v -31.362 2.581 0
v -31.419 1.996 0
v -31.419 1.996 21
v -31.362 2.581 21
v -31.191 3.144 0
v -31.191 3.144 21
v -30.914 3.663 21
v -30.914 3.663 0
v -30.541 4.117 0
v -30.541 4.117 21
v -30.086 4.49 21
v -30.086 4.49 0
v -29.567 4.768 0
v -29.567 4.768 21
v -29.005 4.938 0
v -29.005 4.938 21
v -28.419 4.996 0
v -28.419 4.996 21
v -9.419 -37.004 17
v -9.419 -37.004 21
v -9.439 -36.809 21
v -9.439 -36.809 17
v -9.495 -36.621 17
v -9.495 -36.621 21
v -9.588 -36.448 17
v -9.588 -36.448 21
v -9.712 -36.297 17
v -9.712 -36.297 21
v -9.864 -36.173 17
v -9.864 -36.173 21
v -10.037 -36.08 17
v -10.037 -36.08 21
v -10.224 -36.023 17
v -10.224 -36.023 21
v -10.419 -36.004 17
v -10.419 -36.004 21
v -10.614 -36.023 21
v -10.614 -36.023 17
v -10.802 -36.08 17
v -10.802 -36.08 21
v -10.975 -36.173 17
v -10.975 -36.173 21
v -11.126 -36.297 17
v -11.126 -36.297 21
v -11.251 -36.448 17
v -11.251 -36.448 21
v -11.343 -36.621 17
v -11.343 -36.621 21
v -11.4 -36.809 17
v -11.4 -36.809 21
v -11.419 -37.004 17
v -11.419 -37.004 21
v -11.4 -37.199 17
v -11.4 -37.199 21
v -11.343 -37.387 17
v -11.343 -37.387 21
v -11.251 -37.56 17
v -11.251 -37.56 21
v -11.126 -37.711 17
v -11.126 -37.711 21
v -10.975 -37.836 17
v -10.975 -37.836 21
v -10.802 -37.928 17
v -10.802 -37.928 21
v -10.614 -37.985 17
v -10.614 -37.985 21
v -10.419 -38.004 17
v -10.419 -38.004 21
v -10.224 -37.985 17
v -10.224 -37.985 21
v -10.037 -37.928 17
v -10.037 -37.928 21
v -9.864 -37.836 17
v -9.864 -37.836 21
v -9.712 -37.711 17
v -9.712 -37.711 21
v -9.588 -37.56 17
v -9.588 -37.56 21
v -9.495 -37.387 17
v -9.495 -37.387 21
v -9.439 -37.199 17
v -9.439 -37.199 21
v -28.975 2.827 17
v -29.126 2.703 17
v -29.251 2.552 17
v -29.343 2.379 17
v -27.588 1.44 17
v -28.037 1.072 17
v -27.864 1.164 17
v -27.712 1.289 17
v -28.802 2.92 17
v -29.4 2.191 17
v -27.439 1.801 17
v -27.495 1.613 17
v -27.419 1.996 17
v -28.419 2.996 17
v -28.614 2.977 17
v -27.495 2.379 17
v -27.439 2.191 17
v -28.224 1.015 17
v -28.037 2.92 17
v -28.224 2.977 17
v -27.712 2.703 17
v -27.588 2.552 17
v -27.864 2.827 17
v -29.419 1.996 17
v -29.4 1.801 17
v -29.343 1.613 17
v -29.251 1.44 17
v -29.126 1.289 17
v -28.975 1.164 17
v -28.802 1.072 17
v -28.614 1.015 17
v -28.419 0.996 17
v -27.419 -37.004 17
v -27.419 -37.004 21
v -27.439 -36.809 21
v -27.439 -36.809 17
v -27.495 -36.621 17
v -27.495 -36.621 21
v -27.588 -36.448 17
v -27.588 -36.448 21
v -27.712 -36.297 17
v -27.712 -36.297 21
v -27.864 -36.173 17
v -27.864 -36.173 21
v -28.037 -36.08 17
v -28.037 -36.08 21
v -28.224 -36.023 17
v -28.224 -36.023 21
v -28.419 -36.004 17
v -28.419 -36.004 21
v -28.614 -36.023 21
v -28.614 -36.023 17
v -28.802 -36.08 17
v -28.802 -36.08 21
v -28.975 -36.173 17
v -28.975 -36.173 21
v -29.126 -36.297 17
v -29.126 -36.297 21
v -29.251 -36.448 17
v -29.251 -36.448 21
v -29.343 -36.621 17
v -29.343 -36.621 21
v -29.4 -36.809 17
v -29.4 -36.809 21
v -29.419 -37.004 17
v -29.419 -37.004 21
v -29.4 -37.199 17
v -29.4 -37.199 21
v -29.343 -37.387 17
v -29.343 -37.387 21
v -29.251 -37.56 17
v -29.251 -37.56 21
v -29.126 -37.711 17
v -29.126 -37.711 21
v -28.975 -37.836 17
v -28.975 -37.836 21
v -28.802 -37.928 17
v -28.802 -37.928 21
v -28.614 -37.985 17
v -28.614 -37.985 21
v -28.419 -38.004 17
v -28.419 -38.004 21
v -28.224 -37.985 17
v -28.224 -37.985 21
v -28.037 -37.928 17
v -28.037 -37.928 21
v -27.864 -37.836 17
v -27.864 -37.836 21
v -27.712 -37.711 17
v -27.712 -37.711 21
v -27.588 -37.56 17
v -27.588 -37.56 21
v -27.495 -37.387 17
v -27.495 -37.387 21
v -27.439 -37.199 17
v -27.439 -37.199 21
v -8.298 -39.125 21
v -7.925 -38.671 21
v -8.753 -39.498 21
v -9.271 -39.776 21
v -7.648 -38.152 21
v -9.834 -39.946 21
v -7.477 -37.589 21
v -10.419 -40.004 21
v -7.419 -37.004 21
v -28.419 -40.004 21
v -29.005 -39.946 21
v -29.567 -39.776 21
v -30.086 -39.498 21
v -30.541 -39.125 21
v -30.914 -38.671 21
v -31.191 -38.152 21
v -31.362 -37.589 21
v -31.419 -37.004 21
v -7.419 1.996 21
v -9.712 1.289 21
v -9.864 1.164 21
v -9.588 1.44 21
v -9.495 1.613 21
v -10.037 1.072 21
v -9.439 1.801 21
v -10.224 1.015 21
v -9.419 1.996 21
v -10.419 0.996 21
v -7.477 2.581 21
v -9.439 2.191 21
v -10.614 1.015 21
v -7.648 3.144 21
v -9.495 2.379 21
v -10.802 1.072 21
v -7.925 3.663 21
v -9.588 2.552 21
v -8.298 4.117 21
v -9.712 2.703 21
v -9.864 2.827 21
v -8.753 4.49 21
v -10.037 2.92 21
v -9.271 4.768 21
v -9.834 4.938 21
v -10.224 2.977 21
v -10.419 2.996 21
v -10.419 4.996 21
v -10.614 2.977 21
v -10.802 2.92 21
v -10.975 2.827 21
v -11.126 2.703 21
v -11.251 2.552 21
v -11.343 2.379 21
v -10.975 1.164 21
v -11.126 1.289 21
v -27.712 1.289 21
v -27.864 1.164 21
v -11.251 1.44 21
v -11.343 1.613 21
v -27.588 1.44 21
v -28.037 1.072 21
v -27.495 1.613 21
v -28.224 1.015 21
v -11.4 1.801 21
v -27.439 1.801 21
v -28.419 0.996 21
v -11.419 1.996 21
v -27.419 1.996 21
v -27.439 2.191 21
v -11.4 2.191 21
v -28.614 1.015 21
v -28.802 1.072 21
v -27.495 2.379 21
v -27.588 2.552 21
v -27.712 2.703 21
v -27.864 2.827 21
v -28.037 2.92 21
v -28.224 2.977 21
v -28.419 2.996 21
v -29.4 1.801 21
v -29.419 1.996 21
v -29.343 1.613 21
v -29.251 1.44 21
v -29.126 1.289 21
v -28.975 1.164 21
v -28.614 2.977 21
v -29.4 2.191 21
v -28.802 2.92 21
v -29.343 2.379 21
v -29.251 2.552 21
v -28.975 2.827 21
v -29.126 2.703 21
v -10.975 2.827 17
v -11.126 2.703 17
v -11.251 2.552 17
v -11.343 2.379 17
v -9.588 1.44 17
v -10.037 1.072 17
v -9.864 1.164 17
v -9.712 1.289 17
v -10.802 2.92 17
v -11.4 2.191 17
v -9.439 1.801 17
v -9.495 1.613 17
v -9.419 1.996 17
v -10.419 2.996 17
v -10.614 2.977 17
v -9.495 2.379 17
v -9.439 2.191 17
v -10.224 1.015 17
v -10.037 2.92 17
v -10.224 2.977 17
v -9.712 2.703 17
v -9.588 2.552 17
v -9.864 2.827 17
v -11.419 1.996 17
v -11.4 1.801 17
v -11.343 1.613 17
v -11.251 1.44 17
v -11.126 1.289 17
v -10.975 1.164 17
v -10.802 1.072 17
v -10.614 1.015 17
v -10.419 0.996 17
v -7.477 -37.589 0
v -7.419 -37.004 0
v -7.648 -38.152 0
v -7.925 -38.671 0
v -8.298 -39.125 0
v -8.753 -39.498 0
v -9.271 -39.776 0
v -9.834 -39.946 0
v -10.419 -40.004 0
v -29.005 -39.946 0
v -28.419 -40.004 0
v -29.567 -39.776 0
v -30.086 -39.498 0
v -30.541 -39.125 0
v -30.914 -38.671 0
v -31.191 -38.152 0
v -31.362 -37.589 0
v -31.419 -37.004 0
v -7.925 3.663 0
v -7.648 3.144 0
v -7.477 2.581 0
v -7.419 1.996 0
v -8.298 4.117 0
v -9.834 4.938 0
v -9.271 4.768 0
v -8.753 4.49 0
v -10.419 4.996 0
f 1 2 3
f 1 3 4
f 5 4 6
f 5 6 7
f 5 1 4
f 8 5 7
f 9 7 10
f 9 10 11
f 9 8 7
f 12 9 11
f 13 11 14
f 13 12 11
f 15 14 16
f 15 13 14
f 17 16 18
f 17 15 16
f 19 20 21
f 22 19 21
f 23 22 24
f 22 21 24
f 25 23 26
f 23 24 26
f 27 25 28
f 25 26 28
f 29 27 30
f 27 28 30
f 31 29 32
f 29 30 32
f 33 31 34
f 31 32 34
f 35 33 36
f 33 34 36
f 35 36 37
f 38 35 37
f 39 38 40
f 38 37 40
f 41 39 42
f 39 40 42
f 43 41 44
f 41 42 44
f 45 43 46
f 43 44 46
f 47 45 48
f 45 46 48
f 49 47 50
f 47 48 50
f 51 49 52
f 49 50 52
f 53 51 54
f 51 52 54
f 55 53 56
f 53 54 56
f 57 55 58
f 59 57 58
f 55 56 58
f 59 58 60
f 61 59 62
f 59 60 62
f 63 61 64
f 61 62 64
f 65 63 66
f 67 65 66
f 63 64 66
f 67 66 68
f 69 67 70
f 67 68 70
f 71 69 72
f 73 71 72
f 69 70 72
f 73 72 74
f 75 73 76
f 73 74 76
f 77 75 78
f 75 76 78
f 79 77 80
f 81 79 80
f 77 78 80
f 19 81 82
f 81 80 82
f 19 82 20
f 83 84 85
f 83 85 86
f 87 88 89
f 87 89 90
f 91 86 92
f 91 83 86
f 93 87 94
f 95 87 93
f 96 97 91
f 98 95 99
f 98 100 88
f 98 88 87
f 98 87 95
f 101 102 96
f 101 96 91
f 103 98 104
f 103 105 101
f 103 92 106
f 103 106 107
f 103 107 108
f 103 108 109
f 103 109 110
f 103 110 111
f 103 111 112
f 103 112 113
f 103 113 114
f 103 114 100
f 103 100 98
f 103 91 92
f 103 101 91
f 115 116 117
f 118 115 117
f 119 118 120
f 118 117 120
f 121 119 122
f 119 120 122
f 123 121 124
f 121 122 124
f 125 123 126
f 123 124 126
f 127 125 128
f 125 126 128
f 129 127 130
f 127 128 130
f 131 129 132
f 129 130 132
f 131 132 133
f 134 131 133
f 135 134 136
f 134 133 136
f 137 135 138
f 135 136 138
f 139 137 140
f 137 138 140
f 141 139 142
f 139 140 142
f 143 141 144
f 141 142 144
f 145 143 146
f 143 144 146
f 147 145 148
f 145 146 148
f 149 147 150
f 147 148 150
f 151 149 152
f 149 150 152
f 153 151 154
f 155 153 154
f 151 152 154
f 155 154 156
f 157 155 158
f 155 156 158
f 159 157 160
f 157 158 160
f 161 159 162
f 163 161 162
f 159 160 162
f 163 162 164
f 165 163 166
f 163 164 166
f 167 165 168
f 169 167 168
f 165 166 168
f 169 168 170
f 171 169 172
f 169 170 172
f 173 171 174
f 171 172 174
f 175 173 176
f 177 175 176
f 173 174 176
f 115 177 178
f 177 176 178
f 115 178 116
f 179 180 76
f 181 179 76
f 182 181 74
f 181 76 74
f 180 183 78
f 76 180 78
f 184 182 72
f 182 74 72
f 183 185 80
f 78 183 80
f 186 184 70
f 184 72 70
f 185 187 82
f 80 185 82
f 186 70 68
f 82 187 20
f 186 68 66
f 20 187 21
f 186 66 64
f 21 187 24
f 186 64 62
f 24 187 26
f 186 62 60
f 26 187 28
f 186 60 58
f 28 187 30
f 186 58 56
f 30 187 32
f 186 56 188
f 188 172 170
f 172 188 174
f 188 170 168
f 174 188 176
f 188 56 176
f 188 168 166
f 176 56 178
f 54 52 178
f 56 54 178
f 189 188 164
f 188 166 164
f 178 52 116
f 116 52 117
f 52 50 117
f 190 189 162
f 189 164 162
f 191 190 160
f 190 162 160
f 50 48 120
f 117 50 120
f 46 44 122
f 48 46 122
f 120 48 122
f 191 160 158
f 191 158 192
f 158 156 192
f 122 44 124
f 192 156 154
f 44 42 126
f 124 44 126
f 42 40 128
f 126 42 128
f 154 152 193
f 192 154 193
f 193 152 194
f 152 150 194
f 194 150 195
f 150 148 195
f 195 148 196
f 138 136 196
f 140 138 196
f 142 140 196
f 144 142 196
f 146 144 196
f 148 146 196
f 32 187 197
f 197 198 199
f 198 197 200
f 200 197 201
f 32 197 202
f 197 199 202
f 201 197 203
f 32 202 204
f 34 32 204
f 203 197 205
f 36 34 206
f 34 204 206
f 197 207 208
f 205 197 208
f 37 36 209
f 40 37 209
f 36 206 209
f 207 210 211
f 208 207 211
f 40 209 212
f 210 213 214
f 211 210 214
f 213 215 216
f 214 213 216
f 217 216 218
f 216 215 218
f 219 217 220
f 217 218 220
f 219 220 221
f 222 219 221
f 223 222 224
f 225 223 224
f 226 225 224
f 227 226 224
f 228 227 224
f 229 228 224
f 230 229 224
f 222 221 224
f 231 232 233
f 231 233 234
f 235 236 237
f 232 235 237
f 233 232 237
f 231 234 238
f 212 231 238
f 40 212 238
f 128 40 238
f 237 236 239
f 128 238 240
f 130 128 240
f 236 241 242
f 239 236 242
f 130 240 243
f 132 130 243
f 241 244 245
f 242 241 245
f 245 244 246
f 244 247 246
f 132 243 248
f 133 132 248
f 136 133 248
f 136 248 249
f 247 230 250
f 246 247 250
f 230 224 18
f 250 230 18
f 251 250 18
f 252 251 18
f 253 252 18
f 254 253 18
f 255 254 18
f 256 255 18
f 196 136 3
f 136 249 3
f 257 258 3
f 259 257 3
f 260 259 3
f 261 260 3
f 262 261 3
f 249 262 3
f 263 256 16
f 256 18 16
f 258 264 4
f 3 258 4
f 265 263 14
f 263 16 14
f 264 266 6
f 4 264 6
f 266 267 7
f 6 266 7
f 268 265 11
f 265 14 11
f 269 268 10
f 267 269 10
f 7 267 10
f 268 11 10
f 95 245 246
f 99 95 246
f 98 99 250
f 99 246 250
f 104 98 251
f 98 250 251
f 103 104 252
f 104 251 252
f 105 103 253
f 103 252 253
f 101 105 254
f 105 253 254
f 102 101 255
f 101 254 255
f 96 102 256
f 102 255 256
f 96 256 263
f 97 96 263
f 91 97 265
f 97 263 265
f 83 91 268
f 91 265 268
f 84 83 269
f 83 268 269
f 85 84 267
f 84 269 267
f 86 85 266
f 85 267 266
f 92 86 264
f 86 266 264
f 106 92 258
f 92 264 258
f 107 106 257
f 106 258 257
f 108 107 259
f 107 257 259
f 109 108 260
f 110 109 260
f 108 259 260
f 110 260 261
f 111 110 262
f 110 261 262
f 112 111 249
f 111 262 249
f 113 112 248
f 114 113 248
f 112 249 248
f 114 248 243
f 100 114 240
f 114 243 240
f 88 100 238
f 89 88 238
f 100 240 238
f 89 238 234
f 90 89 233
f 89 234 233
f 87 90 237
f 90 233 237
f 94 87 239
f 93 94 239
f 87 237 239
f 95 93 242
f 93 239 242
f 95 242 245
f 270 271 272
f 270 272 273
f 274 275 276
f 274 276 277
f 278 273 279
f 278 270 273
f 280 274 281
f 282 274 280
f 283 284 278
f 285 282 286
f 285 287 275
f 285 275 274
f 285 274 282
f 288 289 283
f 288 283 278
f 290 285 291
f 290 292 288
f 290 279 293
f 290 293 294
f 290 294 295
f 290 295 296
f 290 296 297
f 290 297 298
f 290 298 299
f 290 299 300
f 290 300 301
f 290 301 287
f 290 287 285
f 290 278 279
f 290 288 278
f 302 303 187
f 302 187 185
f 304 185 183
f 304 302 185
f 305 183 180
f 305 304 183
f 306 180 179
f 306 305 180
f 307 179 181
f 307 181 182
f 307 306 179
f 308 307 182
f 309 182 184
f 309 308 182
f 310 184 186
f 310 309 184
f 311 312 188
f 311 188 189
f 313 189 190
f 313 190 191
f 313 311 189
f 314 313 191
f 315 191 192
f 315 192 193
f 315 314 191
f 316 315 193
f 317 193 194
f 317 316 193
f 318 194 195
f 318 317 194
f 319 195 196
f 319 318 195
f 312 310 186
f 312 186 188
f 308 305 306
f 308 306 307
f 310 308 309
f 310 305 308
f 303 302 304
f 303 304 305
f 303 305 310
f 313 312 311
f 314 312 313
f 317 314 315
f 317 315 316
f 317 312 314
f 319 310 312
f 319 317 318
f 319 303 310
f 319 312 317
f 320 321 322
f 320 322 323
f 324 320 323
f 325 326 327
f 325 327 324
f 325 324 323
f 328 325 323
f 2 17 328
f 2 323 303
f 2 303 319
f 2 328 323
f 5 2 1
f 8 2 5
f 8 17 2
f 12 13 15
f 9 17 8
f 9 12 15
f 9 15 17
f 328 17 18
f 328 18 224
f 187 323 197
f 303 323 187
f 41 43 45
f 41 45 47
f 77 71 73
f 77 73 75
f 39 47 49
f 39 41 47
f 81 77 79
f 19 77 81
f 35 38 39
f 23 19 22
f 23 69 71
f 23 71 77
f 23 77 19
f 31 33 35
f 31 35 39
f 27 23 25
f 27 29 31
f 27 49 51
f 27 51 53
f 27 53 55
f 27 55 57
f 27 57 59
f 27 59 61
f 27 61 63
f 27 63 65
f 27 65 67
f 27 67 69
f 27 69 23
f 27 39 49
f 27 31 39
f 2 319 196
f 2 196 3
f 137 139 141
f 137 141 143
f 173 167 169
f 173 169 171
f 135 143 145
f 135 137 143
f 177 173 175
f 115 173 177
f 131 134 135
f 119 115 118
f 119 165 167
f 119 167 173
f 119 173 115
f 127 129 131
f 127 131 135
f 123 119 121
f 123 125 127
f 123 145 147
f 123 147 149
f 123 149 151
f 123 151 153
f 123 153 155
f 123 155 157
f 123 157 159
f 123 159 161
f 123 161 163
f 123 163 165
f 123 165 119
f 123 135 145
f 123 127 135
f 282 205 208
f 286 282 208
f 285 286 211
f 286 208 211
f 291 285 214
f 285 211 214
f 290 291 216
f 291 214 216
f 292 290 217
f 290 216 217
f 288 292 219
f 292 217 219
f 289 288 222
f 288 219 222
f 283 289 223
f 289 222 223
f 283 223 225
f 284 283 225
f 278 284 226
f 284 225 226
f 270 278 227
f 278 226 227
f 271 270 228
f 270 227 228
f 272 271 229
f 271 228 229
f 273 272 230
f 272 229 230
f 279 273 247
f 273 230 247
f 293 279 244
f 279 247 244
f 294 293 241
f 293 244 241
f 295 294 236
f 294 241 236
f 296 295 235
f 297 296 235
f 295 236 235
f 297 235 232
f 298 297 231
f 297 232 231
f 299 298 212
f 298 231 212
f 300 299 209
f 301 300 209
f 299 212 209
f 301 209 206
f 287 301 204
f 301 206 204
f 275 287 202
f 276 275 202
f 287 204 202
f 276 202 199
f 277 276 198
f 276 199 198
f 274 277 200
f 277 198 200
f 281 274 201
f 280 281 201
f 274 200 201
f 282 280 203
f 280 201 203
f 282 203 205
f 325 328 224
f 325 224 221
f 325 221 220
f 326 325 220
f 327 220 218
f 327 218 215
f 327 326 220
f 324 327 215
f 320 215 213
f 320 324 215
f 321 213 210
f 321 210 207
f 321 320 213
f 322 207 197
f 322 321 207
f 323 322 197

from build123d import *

# Parameters (mm, degrees)
BOSS_EXTRU_1_DEPTH       = 21
ESQUISSE2_R              = 1
ENL_V_MAT_EXTRU_7_DEPTH  = 4
ESQUISSE6_R              = 1
ENL_V_MAT_EXTRU_8_DEPTH  = 4
ESQUISSE7_R              = 1
ENL_V_MAT_EXTRU_9_DEPTH  = 4
ESQUISSE8_R              = 1
ENL_V_MAT_EXTRU_10_DEPTH = 4


with BuildPart() as part:
    # Esquisse1 → Boss.-Extru.1 (new body)
    with BuildSketch(Plane.XY):
        with BuildLine():
            Line((-28.419332535, 4.995952024), (-10.419332535, 4.995952024))
            ThreePointArc((-10.419332535, 4.995952024), (-8.298012191, 4.117272368), (-7.419332535, 1.995952024))
            Line((-7.419332535, 1.995952024), (-7.419332535, -37.004047976))
            ThreePointArc((-7.419332535, -37.004047976), (-8.298012191, -39.12536832), (-10.419332535, -40.004047976))
            Line((-10.419332535, -40.004047976), (-28.419332535, -40.004047976))
            ThreePointArc((-28.419332535, -40.004047976), (-30.540652878, -39.12536832), (-31.419332535, -37.004047976))
            Line((-31.419332535, -37.004047976), (-31.419332535, 1.995952024))
            ThreePointArc((-31.419332535, 1.995952024), (-30.540652878, 4.117272368), (-28.419332535, 4.995952024))
        make_face()
    extrude(amount=BOSS_EXTRU_1_DEPTH)

    # Esquisse2 → Enlèv. mat.-Extru.7 (cut)
    with BuildSketch(Plane.XY.offset(21)):
        with Locations((-28.419332535, -37.004047976)):
            Circle(ESQUISSE2_R)
    extrude(amount=-ENL_V_MAT_EXTRU_7_DEPTH, mode=Mode.SUBTRACT)

    # Esquisse6 → Enlèv. mat.-Extru.8 (cut)
    with BuildSketch(Plane.XY.offset(21)):
        with Locations((-10.419332535, -37.004047976)):
            Circle(ESQUISSE6_R)
    extrude(amount=-ENL_V_MAT_EXTRU_8_DEPTH, mode=Mode.SUBTRACT)

    # Esquisse7 → Enlèv. mat.-Extru.9 (cut)
    with BuildSketch(Plane.XY.offset(21)):
        with Locations((-28.419332535, 1.995952024)):
            Circle(ESQUISSE7_R)
    extrude(amount=-ENL_V_MAT_EXTRU_9_DEPTH, mode=Mode.SUBTRACT)

    # Esquisse8 → Enlèv. mat.-Extru.10 (cut)
    with BuildSketch(Plane.XY.offset(21)):
        with Locations((-10.419332535, 1.995952024)):
            Circle(ESQUISSE8_R)
    extrude(amount=-ENL_V_MAT_EXTRU_10_DEPTH, mode=Mode.SUBTRACT)


solid = part.part
